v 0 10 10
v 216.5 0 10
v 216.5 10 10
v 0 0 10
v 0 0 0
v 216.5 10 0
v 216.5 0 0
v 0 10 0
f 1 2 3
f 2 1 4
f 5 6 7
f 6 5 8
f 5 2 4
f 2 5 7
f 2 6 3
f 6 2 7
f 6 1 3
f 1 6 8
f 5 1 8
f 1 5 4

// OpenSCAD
// file: parts/beam.scad
// Repro INCIDENTS.md 2026-09-04: beam default 211 vs computed 216.5.
module beam(len = 211, w = 10) { cube([len, w, w]); }
beam();
// main file
use <parts/beam.scad>
span = 240; node_r = 11.75;
beam(len = span - 2*node_r, w = 10);
